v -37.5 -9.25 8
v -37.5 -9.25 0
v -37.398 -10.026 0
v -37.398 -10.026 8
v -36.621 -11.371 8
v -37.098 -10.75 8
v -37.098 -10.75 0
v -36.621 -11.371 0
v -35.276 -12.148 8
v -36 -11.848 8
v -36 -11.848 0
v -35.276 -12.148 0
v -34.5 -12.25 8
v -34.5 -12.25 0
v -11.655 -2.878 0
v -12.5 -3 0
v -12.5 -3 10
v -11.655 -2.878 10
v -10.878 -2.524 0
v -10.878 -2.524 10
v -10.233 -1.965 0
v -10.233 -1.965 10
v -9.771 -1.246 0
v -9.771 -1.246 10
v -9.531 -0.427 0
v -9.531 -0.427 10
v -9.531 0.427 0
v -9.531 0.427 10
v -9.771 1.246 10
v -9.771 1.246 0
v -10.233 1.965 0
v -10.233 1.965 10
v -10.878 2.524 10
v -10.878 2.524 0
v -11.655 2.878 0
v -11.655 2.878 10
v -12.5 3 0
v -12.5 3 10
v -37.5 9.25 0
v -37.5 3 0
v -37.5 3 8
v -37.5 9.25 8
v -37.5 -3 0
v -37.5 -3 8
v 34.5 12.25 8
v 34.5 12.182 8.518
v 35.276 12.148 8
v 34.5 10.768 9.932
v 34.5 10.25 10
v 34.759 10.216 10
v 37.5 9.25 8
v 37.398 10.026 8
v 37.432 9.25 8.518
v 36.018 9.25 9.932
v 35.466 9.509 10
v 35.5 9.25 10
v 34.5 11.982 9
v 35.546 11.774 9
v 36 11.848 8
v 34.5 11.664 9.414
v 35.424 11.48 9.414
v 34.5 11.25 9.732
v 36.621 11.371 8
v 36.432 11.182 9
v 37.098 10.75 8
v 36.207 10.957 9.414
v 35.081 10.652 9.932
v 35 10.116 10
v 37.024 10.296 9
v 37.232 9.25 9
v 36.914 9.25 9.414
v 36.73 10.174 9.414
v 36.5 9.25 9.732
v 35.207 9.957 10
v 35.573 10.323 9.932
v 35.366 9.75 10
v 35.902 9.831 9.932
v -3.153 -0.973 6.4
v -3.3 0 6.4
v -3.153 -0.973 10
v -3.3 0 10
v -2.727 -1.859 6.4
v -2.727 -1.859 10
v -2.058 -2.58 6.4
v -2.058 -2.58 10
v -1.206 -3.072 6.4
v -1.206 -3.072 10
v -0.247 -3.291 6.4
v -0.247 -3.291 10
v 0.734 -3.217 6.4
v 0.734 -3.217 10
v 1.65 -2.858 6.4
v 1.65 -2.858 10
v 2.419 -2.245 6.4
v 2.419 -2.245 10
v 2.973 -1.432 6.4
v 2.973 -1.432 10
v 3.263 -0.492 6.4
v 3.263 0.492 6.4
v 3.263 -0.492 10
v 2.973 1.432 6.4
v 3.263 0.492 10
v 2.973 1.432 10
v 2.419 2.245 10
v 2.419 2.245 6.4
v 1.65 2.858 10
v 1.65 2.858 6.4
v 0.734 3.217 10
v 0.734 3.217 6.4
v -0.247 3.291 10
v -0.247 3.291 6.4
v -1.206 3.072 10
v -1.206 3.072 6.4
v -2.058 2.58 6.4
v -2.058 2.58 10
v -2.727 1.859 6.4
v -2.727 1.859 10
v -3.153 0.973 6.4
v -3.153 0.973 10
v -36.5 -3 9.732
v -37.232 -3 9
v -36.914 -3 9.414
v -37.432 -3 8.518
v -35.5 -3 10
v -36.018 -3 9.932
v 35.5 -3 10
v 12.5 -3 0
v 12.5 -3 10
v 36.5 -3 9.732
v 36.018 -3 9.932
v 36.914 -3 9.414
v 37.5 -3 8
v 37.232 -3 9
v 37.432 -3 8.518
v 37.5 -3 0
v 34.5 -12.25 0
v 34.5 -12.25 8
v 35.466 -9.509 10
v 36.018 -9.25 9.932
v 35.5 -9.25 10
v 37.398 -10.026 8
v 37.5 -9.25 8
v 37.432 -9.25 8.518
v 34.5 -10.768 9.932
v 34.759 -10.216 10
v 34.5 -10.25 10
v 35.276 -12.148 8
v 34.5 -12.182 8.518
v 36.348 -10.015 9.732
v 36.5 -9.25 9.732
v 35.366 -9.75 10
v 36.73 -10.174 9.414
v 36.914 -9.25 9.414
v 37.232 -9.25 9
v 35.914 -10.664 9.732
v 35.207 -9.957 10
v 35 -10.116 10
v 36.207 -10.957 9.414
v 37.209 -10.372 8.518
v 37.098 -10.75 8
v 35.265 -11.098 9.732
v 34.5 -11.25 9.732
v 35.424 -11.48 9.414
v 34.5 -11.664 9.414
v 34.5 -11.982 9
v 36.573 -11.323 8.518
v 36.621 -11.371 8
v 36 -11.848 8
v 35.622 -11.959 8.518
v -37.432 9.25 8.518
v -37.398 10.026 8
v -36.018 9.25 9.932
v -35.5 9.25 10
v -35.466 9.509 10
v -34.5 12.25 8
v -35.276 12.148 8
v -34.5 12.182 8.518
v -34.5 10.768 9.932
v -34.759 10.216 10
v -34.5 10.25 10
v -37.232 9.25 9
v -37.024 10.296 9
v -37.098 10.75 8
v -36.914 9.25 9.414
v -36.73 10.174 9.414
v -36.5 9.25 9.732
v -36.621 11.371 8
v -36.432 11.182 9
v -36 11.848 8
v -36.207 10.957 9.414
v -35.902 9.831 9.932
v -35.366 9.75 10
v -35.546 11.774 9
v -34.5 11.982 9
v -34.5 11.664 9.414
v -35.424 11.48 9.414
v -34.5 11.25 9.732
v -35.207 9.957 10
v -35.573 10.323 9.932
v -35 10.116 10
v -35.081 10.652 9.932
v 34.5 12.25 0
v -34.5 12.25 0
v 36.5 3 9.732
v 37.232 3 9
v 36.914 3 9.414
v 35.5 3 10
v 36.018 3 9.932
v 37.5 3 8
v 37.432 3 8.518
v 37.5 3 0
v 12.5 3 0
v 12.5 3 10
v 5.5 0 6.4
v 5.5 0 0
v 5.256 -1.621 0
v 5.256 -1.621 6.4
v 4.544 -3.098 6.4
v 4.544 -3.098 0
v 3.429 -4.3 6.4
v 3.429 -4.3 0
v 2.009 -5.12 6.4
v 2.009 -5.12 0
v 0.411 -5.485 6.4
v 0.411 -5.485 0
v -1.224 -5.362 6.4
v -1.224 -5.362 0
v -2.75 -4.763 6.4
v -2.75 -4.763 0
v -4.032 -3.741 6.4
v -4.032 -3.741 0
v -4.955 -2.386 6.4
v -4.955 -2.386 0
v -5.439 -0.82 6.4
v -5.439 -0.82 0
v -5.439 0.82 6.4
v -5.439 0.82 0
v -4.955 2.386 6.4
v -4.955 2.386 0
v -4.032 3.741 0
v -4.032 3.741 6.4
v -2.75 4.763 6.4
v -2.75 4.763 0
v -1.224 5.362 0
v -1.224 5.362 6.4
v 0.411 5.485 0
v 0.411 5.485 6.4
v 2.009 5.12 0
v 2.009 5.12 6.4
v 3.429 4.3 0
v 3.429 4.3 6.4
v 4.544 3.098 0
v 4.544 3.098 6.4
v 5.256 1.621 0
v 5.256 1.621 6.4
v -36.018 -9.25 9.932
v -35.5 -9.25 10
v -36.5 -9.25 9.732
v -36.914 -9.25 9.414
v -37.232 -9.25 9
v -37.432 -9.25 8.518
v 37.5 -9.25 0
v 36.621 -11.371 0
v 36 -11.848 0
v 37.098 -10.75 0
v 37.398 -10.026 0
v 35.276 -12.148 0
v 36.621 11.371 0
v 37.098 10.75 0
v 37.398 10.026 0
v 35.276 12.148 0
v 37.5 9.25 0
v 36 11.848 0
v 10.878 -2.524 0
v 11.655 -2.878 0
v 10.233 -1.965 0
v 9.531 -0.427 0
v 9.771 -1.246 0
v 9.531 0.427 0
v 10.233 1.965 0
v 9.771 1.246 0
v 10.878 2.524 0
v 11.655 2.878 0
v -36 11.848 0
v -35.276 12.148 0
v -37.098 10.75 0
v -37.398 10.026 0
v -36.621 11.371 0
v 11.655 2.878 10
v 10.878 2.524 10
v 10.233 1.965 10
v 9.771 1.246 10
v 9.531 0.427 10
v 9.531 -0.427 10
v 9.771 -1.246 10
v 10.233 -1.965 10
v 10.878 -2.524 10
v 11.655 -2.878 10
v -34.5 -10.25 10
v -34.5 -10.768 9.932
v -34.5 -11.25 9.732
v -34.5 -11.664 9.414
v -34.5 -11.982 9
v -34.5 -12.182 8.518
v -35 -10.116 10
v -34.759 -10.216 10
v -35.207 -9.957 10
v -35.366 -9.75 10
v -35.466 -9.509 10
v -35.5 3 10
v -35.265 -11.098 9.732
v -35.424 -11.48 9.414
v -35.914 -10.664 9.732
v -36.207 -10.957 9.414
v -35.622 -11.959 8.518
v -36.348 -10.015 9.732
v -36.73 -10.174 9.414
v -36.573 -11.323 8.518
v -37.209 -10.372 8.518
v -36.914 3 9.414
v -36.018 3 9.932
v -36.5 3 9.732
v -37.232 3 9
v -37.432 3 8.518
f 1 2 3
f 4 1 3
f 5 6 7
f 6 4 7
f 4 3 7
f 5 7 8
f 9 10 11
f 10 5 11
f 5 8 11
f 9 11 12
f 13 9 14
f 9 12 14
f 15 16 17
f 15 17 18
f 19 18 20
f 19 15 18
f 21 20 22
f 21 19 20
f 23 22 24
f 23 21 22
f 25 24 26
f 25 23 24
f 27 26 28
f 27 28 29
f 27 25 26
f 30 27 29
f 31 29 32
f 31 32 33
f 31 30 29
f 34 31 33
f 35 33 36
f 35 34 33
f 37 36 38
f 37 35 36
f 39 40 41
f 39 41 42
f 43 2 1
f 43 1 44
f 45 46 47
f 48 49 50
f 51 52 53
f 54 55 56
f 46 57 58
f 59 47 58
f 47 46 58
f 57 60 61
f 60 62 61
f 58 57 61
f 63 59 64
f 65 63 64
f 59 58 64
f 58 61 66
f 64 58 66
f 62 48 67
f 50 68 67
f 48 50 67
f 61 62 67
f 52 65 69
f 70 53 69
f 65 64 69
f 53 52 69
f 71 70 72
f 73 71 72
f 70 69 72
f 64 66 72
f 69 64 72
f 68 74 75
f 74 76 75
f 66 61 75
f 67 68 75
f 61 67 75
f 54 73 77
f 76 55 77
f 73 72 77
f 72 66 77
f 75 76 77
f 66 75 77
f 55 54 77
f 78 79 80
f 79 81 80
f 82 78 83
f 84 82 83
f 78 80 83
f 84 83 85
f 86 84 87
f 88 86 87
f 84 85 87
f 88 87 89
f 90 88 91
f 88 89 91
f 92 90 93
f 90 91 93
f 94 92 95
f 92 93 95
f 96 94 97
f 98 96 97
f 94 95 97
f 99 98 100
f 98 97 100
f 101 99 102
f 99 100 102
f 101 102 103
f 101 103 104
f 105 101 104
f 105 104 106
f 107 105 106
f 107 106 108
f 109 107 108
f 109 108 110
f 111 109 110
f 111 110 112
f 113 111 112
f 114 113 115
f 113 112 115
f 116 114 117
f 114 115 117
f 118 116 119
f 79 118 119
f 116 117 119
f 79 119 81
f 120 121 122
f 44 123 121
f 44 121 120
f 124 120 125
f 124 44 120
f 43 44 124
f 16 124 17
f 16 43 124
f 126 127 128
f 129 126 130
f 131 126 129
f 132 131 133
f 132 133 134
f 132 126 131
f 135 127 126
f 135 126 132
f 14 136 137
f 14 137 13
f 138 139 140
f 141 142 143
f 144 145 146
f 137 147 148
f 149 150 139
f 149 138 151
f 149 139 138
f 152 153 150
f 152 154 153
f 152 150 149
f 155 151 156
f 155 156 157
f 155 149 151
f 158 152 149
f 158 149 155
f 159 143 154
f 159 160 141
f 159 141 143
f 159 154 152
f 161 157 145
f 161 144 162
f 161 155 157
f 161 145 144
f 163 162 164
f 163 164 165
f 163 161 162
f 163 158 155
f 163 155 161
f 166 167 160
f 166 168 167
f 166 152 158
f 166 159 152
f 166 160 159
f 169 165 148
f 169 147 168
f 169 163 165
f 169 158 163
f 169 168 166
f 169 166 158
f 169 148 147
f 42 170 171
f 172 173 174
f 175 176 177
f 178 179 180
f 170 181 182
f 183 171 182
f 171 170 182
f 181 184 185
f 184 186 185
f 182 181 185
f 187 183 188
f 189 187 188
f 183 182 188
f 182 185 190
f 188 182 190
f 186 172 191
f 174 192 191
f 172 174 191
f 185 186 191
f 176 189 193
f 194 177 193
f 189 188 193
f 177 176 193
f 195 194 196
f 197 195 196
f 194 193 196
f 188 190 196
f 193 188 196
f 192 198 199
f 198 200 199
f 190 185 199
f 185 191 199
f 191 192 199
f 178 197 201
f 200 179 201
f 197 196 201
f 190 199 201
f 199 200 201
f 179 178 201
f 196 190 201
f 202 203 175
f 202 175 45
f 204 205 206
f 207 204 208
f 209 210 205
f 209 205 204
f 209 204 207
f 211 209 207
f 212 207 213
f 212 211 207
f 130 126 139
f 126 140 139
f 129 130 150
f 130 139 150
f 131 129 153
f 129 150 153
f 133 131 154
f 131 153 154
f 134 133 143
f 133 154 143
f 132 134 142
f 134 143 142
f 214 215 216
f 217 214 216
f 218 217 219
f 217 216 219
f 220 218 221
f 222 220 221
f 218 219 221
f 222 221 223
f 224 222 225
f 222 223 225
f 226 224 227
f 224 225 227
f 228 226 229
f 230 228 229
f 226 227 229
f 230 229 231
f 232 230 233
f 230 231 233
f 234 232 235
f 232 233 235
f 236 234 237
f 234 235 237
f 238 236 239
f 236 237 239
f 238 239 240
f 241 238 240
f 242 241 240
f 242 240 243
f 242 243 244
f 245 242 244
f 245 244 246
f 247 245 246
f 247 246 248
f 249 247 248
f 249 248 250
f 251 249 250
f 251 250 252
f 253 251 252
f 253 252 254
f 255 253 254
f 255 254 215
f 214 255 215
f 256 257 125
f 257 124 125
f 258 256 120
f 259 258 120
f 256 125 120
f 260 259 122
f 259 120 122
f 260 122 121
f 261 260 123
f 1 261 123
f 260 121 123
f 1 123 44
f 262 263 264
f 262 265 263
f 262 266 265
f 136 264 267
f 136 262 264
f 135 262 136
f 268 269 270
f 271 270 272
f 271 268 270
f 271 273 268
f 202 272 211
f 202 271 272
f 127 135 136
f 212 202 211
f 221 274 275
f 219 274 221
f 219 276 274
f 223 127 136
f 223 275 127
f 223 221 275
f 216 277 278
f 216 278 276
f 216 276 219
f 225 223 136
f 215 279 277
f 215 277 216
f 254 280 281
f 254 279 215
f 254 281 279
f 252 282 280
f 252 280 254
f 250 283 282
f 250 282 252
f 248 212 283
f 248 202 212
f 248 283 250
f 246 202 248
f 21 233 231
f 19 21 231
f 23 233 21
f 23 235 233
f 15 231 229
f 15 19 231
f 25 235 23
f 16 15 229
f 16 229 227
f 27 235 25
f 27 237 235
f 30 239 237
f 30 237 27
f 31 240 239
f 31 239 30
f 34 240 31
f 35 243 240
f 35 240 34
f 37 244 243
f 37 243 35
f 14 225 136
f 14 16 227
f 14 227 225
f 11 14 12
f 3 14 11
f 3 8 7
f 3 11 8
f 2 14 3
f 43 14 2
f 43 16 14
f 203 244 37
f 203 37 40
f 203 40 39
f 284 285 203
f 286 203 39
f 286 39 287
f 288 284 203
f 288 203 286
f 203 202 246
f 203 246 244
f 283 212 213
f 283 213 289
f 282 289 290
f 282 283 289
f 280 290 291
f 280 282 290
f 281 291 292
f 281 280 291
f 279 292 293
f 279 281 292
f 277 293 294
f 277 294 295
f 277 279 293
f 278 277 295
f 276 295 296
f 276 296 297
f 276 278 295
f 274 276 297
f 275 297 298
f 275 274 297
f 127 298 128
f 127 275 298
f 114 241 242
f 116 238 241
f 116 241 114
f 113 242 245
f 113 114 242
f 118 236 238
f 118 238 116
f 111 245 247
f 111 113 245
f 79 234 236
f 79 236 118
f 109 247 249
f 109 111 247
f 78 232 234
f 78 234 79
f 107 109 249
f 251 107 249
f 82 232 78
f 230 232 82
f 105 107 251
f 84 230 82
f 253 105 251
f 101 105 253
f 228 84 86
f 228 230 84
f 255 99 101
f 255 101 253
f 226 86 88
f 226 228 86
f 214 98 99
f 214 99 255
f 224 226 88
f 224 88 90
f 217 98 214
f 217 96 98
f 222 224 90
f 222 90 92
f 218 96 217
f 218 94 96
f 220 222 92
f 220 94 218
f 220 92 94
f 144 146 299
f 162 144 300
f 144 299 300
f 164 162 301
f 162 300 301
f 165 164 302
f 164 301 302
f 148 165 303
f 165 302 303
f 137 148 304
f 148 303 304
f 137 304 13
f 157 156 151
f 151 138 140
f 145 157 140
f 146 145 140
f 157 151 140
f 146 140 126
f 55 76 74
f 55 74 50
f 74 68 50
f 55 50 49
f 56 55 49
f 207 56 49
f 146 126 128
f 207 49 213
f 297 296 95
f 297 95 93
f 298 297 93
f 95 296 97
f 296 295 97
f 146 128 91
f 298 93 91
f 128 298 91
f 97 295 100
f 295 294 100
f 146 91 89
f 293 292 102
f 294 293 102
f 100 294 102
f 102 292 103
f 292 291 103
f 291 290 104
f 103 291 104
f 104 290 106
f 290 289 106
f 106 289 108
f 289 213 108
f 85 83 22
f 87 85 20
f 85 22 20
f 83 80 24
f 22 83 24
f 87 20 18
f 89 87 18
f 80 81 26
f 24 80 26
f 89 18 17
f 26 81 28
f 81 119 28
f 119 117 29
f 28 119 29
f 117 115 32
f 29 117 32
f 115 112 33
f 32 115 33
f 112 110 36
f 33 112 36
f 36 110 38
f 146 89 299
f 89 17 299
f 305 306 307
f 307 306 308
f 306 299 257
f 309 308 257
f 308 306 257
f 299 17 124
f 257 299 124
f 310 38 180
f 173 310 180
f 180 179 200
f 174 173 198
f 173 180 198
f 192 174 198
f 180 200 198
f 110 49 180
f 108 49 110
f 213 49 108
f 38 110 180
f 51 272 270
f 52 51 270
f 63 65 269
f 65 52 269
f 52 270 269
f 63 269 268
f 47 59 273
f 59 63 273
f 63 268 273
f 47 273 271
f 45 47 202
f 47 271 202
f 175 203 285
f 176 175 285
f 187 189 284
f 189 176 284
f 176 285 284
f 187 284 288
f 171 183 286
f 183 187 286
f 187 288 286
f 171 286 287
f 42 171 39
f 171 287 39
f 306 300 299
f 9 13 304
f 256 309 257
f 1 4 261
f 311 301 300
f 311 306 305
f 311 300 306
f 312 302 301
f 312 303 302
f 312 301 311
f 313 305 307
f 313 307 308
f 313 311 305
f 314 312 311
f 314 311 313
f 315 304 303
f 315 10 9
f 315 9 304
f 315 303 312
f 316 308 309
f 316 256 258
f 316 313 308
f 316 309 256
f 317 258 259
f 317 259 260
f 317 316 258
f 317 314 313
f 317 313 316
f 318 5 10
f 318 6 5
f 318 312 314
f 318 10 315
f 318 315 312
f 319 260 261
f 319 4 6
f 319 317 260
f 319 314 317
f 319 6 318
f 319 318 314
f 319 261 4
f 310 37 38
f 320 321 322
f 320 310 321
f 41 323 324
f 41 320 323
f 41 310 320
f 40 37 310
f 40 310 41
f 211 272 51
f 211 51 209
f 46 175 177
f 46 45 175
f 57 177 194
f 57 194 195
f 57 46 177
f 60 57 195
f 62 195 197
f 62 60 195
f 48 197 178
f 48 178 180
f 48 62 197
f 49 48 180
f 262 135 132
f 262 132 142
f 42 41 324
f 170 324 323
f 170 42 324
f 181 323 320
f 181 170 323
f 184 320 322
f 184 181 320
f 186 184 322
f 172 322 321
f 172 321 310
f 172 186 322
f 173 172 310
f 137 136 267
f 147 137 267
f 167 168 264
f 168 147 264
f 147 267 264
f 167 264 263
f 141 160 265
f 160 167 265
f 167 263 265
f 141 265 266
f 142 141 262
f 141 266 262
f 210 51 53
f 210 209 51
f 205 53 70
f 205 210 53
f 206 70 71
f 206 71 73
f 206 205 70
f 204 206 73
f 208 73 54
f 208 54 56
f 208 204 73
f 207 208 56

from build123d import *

# Parameters (mm, degrees)
PAD_DEPTH        = 10
HOLE_D           = 6.6
HOLE_DEPTH       = 25
HOLE_CBORE_D     = 11
HOLE_CBORE_DEPTH = 6.4
FILLET_R         = 2
FILLET001_R      = 2


with BuildPart() as part:
    # Sketch → Pad (new body)
    with BuildSketch(Plane.XY):
        with BuildLine():
            Line((-34.5, 12.25), (34.5, 12.25))
            ThreePointArc((37.5, 9.25), (36.62132, 11.37132), (34.5, 12.25))
            Line((37.5, 9.25), (37.5, 3))
            Line((37.5, 3), (12.5, 3))
            ThreePointArc((12.5, 3), (9.5, 0), (12.5, -3))
            Line((12.5, -3), (37.5, -3))
            Line((37.5, -3), (37.5, -9.25))
            ThreePointArc((34.5, -12.25), (36.62132, -11.37132), (37.5, -9.25))
            Line((34.5, -12.25), (-34.5, -12.25))
            ThreePointArc((-37.5, -9.25), (-36.62132, -11.37132), (-34.5, -12.25))
            Line((-37.5, -9.25), (-37.5, -3))
            Line((-37.5, -3), (-12.5, -3))
            ThreePointArc((-12.5, -3), (-9.5, 0), (-12.5, 3))
            Line((-12.5, 3), (-37.5, 3))
            Line((-37.5, 3), (-37.5, 9.25))
            ThreePointArc((-34.5, 12.25), (-36.62132, 11.37132), (-37.5, 9.25))
        make_face()
    extrude(amount=PAD_DEPTH)

    # Hole
    with Locations(Plane(origin=(0, 0, 0), x_dir=(1, 0, 0), z_dir=(0, 0, -1))):
        with Locations((0, 0)):
            CounterBoreHole(HOLE_D / 2, HOLE_CBORE_D / 2, HOLE_CBORE_DEPTH, depth=HOLE_DEPTH)

    # Fillet
    fillet_edges = [part.edges().sort_by_distance(p)[0] for p in [
        (0, 12.25, 10),
    ]]
    fillet(fillet_edges, radius=FILLET_R)

    # Fillet001
    fillet001_edges = [part.edges().sort_by_distance(p)[0] for p in [
        (0, -12.25, 10),
    ]]
    fillet(fillet001_edges, radius=FILLET001_R)


solid = part.part
